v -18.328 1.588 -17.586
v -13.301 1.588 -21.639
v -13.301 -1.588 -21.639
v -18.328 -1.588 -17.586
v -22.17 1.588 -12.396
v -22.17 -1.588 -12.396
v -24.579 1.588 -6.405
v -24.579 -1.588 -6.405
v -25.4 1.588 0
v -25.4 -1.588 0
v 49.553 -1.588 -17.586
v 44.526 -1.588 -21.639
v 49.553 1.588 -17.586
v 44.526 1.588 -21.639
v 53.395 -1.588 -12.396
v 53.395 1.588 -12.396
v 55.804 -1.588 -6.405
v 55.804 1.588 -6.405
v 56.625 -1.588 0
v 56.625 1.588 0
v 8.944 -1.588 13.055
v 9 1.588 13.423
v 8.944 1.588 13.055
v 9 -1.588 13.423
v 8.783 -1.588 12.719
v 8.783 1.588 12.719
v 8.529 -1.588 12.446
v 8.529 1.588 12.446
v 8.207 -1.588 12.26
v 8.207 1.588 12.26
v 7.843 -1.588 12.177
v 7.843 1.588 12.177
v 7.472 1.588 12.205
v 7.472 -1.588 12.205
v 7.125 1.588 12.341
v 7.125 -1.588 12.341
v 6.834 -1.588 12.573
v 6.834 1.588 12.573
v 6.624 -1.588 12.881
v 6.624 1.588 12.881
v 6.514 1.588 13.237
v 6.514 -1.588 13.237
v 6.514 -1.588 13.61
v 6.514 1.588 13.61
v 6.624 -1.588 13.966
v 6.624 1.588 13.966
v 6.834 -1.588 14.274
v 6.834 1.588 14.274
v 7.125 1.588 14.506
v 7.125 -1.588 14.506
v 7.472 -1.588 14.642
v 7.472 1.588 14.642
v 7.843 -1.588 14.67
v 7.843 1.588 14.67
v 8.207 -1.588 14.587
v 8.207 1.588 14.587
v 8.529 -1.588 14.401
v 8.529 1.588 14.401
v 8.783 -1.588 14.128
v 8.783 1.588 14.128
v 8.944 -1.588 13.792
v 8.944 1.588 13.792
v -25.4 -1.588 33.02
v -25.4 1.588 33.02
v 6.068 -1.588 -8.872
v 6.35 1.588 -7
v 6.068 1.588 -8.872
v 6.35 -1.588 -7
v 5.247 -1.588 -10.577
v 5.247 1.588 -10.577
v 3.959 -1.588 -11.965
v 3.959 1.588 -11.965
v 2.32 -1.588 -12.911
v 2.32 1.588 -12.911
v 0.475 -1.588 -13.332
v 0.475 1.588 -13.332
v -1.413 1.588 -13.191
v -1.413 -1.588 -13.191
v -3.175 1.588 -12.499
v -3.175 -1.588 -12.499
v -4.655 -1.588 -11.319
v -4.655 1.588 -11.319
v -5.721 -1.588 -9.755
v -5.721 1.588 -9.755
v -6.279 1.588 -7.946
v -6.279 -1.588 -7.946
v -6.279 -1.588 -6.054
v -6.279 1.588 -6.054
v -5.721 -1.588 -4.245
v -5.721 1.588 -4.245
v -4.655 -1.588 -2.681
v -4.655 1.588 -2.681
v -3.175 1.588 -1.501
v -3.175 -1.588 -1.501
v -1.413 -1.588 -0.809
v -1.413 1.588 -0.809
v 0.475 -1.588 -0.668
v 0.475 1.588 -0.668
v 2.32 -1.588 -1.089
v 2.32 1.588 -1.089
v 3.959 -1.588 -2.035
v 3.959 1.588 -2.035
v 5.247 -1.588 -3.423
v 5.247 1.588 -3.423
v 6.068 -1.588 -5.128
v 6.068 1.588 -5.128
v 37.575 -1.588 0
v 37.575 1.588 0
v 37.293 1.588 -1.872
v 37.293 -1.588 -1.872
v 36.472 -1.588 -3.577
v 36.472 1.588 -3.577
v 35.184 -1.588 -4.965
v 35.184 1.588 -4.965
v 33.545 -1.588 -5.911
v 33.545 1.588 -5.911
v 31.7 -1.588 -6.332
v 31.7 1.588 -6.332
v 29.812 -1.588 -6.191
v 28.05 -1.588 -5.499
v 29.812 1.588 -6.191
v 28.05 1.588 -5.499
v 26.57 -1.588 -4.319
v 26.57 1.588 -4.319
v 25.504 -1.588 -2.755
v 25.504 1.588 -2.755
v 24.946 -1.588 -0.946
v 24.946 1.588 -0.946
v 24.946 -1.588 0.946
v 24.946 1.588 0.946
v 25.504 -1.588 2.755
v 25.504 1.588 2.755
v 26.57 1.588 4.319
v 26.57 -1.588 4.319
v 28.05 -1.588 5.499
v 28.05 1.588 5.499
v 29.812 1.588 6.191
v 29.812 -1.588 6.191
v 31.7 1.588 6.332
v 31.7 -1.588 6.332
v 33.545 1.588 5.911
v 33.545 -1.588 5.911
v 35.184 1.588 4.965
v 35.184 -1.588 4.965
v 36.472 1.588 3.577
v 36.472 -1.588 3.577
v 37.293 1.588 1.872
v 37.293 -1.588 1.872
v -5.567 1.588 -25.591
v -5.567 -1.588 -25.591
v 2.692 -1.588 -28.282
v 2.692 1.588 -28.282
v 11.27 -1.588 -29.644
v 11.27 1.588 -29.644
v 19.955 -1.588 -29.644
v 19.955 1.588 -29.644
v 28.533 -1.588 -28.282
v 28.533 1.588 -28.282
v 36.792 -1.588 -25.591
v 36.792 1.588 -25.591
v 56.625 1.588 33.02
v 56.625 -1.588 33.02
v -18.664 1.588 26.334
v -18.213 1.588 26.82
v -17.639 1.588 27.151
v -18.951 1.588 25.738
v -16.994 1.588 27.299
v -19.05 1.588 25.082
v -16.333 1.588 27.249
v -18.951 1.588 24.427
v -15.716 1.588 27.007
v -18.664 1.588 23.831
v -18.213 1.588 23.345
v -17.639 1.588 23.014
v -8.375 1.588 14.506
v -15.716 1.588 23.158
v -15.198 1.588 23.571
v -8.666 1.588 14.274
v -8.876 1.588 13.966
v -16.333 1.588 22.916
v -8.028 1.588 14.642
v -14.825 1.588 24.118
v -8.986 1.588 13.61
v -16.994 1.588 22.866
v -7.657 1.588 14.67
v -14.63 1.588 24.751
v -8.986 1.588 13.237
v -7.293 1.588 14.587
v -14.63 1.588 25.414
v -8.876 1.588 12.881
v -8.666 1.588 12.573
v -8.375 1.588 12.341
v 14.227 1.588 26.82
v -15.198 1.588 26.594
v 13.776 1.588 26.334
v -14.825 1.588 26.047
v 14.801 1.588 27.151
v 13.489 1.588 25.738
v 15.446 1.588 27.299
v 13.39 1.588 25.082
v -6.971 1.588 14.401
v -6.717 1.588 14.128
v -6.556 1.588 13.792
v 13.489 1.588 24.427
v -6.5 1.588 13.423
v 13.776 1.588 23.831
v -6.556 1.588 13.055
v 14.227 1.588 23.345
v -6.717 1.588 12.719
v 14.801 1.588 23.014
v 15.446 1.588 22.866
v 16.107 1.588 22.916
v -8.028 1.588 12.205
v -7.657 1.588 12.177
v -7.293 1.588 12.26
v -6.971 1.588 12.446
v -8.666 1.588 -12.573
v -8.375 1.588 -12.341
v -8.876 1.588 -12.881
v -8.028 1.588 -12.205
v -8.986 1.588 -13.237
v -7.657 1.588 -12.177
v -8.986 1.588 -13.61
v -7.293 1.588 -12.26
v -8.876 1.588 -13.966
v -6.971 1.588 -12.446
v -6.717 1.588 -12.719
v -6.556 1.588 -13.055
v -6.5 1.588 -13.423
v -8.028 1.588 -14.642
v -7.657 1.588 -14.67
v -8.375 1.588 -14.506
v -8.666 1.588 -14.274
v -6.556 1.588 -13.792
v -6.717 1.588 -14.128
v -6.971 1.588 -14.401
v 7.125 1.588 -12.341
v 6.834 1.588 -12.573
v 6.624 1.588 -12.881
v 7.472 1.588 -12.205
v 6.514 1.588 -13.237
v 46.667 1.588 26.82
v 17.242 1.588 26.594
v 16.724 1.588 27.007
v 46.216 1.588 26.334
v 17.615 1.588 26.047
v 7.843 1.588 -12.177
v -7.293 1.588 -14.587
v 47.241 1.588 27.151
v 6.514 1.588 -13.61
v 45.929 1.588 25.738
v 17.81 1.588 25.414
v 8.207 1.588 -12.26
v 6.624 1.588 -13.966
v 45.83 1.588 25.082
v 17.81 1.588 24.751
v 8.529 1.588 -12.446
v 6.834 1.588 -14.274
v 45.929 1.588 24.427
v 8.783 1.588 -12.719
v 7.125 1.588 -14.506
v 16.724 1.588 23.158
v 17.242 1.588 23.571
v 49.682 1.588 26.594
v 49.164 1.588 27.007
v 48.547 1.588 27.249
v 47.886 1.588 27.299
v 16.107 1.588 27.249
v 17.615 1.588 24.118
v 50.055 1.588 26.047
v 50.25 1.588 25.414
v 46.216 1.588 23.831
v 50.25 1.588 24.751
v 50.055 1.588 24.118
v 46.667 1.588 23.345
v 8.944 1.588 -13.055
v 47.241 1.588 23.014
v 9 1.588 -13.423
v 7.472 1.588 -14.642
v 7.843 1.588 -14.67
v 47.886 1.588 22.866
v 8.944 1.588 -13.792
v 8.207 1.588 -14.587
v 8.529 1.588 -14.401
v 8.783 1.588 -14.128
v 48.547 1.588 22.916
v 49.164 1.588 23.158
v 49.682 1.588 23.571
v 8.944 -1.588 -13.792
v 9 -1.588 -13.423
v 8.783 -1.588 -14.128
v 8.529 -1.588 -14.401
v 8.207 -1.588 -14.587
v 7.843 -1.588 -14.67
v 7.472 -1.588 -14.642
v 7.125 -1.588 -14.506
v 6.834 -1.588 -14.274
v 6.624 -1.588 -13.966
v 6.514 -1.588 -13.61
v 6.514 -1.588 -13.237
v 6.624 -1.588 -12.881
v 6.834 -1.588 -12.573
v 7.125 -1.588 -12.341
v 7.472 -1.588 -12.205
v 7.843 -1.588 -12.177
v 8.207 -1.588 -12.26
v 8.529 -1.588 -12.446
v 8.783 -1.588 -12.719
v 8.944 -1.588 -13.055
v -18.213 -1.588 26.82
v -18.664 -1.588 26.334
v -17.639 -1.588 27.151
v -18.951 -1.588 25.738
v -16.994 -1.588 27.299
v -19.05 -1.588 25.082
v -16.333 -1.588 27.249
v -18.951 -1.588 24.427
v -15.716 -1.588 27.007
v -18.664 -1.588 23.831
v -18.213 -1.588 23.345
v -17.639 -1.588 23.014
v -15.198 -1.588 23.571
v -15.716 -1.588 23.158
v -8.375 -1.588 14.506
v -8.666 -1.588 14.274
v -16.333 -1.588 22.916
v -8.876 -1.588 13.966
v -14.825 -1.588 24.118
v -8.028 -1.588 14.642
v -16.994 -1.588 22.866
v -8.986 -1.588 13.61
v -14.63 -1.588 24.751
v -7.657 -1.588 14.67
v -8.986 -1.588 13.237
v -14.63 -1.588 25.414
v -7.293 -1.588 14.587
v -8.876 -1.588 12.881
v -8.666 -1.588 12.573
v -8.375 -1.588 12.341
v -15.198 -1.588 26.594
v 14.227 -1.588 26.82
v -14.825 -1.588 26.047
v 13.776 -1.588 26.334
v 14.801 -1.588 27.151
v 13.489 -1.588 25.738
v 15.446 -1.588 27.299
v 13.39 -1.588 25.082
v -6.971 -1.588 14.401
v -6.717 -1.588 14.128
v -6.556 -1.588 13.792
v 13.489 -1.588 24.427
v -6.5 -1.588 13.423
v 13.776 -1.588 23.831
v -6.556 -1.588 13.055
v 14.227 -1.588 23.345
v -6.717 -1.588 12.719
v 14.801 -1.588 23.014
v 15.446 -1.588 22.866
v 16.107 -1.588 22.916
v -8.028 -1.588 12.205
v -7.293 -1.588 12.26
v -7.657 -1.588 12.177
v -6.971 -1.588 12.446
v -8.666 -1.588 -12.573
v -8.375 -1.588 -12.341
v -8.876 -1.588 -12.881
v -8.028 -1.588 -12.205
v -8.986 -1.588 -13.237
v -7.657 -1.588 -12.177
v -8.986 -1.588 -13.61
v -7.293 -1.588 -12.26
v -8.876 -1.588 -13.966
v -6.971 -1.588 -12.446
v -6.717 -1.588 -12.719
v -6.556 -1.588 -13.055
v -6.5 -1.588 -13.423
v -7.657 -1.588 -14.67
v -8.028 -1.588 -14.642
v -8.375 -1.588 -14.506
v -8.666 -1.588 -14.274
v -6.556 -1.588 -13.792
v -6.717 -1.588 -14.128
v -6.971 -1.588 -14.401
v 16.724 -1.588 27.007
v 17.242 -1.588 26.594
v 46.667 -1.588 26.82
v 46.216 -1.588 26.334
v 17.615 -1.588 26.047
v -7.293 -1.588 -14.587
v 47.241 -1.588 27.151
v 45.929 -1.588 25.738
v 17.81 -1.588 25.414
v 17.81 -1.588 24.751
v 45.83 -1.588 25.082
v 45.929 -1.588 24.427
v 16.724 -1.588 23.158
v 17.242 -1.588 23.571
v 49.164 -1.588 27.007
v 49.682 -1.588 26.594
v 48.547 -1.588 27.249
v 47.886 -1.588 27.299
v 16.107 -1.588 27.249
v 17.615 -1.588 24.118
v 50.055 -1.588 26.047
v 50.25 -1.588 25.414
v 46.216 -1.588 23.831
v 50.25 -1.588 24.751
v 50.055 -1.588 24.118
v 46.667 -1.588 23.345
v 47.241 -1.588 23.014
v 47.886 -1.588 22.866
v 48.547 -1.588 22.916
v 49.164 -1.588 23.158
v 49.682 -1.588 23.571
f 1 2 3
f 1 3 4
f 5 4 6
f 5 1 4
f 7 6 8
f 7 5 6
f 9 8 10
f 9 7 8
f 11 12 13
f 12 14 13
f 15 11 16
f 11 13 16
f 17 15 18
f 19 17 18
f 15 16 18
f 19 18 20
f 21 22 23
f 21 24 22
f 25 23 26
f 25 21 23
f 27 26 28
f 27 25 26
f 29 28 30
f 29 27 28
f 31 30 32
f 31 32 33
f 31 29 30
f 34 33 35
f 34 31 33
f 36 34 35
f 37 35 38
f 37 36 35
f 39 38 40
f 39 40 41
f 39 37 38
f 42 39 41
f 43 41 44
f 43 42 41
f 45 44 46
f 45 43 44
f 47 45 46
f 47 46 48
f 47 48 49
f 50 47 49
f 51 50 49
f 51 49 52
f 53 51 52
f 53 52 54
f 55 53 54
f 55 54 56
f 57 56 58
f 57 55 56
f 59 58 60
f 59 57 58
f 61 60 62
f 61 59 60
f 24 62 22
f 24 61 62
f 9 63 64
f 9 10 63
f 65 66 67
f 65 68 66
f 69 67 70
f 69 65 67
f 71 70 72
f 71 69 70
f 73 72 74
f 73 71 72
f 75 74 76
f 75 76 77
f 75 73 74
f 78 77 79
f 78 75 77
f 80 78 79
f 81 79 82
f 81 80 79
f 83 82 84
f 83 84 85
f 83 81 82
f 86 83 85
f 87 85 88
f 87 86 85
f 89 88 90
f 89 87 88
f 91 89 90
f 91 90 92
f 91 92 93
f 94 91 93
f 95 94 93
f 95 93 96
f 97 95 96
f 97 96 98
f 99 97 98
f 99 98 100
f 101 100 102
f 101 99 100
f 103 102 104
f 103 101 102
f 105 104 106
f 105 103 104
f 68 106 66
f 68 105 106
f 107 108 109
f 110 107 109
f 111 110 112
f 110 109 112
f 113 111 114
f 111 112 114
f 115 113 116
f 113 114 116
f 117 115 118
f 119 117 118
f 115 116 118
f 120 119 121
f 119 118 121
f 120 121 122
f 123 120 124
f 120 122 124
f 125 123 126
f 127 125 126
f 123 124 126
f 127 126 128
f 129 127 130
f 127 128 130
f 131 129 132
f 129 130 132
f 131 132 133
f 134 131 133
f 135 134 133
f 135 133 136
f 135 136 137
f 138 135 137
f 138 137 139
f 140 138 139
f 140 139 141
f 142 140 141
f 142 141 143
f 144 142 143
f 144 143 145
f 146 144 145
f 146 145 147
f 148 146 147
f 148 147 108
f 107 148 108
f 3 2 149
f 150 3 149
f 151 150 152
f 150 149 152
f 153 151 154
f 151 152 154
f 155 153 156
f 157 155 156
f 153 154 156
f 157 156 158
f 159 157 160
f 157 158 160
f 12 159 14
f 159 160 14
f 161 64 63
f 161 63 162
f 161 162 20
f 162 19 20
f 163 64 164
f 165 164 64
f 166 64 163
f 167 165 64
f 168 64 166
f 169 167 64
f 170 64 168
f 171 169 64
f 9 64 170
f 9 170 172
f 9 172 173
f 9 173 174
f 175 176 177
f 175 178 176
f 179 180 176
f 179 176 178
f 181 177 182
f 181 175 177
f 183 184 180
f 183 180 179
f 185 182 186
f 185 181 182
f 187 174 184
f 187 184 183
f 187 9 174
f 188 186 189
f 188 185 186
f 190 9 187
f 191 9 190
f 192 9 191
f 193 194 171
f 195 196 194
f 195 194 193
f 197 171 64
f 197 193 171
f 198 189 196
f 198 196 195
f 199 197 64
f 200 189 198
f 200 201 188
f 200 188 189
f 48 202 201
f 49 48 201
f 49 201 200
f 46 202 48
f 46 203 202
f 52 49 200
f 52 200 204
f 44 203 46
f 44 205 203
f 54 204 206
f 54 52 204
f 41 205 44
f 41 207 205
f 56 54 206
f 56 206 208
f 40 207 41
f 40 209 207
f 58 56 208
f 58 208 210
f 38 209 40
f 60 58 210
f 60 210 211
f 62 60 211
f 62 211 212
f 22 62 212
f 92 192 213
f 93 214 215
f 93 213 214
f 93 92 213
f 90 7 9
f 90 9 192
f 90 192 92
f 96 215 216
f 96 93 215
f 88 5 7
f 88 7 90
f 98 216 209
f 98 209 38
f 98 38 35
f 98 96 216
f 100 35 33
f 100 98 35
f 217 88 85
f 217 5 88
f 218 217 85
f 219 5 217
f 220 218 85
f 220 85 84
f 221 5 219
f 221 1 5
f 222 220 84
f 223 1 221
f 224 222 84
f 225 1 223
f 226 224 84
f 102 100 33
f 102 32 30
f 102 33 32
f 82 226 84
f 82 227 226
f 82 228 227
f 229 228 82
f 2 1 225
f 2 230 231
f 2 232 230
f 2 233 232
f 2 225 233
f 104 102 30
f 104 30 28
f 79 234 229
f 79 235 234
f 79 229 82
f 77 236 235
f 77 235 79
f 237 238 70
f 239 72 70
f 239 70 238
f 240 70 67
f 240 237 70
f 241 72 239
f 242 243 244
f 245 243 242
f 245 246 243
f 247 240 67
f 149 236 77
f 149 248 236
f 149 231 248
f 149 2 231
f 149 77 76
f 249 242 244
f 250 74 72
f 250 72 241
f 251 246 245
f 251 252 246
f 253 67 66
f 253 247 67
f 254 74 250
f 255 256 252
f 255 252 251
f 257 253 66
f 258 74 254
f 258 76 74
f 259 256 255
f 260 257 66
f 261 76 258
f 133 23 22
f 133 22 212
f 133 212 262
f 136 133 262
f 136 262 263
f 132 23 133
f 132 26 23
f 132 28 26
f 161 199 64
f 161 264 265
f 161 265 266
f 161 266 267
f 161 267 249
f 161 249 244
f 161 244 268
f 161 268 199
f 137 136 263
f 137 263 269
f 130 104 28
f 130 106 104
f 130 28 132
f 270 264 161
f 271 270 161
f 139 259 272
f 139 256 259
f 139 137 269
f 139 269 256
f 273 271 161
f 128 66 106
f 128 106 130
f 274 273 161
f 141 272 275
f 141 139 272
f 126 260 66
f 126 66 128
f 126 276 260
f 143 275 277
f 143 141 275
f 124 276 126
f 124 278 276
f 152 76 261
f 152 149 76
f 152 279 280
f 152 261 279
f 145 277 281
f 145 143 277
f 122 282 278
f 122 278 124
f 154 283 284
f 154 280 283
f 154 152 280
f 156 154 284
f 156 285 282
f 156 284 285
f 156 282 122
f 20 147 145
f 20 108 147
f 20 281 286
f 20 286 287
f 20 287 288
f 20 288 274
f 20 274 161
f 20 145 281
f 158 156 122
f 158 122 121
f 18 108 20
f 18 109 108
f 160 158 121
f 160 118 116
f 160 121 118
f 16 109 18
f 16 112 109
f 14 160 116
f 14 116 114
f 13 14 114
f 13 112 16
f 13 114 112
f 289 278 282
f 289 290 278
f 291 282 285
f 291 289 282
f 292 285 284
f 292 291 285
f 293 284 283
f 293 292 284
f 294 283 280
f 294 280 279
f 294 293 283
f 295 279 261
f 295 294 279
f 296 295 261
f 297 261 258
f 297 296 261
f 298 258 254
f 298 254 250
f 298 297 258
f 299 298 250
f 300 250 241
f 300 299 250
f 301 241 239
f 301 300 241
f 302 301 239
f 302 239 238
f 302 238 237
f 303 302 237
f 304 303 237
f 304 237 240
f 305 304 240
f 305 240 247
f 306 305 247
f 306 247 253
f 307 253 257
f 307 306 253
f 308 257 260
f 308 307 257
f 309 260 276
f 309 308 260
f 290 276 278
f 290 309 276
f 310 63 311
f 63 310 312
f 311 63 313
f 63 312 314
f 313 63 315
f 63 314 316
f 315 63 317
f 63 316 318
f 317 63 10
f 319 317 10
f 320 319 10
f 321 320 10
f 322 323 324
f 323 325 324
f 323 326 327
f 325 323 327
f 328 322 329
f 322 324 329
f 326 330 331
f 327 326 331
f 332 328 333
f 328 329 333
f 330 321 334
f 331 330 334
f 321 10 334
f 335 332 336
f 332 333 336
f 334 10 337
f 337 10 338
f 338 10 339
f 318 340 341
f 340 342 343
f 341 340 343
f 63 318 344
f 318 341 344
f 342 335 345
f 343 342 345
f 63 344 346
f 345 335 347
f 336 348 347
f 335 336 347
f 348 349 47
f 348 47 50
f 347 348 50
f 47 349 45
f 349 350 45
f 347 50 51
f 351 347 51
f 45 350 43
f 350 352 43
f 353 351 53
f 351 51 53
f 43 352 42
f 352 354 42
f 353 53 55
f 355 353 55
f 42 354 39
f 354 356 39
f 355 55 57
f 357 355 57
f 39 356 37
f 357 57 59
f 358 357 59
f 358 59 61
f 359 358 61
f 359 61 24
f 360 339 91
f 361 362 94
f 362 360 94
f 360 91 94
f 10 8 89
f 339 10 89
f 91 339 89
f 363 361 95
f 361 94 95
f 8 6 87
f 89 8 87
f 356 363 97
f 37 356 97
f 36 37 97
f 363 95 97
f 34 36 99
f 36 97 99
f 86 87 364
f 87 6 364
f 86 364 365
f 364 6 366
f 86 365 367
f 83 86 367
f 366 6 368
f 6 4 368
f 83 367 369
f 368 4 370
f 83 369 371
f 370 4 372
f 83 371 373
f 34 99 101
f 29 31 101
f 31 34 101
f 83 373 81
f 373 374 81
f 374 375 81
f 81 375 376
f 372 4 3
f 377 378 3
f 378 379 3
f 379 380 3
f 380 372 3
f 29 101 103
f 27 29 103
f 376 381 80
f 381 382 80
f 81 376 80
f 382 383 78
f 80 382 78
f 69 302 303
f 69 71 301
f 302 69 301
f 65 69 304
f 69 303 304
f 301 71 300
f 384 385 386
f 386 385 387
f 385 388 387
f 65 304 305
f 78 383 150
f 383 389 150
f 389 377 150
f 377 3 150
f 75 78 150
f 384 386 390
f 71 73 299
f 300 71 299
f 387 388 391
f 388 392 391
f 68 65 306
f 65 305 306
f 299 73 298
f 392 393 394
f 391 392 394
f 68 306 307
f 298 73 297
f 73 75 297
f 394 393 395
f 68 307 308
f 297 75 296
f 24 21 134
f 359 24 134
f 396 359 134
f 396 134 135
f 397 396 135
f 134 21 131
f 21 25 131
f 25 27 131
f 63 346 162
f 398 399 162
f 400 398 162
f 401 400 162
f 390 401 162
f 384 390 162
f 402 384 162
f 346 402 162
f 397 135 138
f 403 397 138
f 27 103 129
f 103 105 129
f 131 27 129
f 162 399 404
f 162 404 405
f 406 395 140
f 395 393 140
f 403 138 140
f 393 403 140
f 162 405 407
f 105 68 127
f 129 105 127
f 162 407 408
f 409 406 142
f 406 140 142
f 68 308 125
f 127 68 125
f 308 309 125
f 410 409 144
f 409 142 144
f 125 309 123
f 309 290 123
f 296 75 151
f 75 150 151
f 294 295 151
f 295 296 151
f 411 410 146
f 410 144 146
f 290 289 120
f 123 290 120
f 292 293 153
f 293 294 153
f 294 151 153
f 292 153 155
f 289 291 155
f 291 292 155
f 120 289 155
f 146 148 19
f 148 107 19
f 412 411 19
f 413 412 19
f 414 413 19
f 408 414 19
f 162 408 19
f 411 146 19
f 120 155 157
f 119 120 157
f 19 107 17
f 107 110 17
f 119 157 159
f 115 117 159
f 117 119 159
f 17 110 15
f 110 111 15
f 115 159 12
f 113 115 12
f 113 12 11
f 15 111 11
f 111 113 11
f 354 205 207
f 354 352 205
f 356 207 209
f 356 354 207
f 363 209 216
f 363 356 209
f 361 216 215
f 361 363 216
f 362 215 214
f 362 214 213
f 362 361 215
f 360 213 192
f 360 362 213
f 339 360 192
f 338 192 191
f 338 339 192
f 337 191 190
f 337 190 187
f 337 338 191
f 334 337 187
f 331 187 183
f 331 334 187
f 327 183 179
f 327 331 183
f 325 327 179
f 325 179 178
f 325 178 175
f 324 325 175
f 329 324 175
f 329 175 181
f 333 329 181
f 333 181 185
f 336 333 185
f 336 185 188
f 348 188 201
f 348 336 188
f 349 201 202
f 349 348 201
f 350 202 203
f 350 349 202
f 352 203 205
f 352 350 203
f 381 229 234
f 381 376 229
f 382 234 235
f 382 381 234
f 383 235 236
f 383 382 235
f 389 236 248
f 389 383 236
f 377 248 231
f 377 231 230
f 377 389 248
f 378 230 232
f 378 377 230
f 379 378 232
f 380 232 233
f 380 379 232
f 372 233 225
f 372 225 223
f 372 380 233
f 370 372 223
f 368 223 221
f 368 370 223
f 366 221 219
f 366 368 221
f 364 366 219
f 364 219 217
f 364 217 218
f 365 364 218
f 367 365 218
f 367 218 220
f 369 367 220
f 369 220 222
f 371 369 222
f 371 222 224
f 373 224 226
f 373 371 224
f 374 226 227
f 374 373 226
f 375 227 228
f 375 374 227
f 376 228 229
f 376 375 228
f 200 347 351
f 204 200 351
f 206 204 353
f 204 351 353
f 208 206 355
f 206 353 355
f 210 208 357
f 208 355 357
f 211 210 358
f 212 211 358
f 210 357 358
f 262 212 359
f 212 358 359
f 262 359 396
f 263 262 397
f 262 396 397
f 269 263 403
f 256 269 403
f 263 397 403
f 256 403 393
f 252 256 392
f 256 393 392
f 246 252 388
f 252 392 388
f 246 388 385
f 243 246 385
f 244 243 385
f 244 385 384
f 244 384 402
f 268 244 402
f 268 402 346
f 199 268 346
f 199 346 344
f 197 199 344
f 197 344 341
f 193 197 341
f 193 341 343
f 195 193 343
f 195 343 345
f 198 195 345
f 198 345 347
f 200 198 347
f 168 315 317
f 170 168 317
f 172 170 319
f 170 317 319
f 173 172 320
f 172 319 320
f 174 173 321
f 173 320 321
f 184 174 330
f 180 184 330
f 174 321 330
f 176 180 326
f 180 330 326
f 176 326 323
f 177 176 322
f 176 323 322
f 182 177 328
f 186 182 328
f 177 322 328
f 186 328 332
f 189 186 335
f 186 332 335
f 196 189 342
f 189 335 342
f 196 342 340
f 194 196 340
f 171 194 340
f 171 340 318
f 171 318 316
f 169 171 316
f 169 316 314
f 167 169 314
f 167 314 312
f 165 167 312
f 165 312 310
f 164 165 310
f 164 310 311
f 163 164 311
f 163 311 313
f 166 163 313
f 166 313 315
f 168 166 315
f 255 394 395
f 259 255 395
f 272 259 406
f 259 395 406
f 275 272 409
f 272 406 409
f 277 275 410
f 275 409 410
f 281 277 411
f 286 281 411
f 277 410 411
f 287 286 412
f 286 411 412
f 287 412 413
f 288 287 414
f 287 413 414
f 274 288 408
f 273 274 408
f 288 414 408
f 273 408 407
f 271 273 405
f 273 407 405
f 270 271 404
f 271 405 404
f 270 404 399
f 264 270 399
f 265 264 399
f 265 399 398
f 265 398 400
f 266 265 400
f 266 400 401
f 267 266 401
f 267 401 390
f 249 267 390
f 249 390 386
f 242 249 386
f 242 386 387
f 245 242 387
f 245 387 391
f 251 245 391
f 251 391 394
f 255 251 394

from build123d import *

# Parameters (mm, degrees)
SKETCH3_R                = 6.35
SKETCH3_R_2              = 1.25
BOSS_EXTRUDE4_DEPTH      = 1.5875
BOSS_EXTRUDE7_DEPTH      = 1.5875
BOSS_EXTRUDE7_DEPTH_BACK = 1.5875
SKETCH9_R                = 6.35
CUT_EXTRUDE3_DEPTH       = 4.175
SKETCH11_W               = 82.024989992
SKETCH11_H               = 3.175
BOSS_EXTRUDE8_DEPTH      = 7.62
SKETCH10_R               = 2.2225
CUT_EXTRUDE4_DEPTH       = 4.175


with BuildPart() as part:
    # Sketch3 → Boss-Extrude4 (new body, symmetric)
    with BuildSketch(Plane(origin=(0, 0, 0), x_dir=(1, 0, 0), z_dir=(0, 1, 0))):
        with BuildLine():
            Line((-25.4, 0), (-25.4, -25.4))
            Line((-25.4, -25.4), (0, -25.4))
            Line((0, -25.4), (25.4, -25.4))
            Line((25.4, -25.4), (25.4, 0))
            ThreePointArc((25.4, 0), (0, 25.4), (-25.4, 0))
        make_face()
        with Locations((0, 7)):
            Circle(SKETCH3_R, mode=Mode.SUBTRACT)
        with Locations((7.75, 13.423393759)):
            Circle(SKETCH3_R_2, mode=Mode.SUBTRACT)
        with Locations((-7.75, 13.423393759)):
            Circle(SKETCH3_R_2, mode=Mode.SUBTRACT)
        with Locations((-7.75, -13.423393759)):
            Circle(SKETCH3_R_2, mode=Mode.SUBTRACT)
        with Locations((7.75, -13.423393759)):
            Circle(SKETCH3_R_2, mode=Mode.SUBTRACT)
    extrude(amount=BOSS_EXTRUDE4_DEPTH, both=True)

    # Sketch8 → Boss-Extrude7 (add, two sides)
    with BuildSketch(Plane(origin=(0, 0, 0), x_dir=(1, 0, 0), z_dir=(0, 1, 0))) as boss_extrude7_sk:
        with BuildLine():
            Line((25.4, -25.4), (25.4, 0))
            ThreePointArc((25.4, 0), (12.395970521, 22.169797357), (-13.300780696, 21.639067283))
            ThreePointArc((-13.300780696, 21.639067283), (15.612494996, 29.814593742), (44.525770688, 21.639067283))
            ThreePointArc((44.525770688, 21.639067283), (53.394787349, 12.395970521), (56.624989992, 0))
            Line((56.624989992, 0), (56.624989992, -25.4))
            Line((56.624989992, -25.4), (25.4, -25.4))
        make_face()
    extrude(amount=BOSS_EXTRUDE7_DEPTH)
    extrude(boss_extrude7_sk.sketch, amount=-BOSS_EXTRUDE7_DEPTH_BACK)

    # Sketch9 → Cut-Extrude3 (cut, through all)
    with BuildSketch(Plane(origin=(0, 1.5875, 0), x_dir=(1, 0, 0), z_dir=(0, 1, 0))):
        with Locations((31.224989992, 0)):
            Circle(SKETCH9_R)
    extrude(amount=-CUT_EXTRUDE3_DEPTH, mode=Mode.SUBTRACT)

    # Sketch11 → Boss-Extrude8 (add)
    with BuildSketch(Plane.XY.offset(25.4)):
        with Locations((15.612494996, 0)):
            Rectangle(SKETCH11_W, SKETCH11_H)
    extrude(amount=BOSS_EXTRUDE8_DEPTH)

    # Sketch10 → Cut-Extrude4 (cut, through all)
    with BuildSketch(Plane(origin=(0, -1.5875, 0), x_dir=(-1, 0, 0), z_dir=(0, -1, 0))):
        with Locations((-15.612494996, -25.0825)):
            Circle(SKETCH10_R)
        with Locations((-48.052489992, -25.0825)):
            Circle(SKETCH10_R)
        with Locations((16.8275, -25.0825)):
            Circle(SKETCH10_R)
    extrude(amount=-CUT_EXTRUDE4_DEPTH, mode=Mode.SUBTRACT)


solid = part.part
